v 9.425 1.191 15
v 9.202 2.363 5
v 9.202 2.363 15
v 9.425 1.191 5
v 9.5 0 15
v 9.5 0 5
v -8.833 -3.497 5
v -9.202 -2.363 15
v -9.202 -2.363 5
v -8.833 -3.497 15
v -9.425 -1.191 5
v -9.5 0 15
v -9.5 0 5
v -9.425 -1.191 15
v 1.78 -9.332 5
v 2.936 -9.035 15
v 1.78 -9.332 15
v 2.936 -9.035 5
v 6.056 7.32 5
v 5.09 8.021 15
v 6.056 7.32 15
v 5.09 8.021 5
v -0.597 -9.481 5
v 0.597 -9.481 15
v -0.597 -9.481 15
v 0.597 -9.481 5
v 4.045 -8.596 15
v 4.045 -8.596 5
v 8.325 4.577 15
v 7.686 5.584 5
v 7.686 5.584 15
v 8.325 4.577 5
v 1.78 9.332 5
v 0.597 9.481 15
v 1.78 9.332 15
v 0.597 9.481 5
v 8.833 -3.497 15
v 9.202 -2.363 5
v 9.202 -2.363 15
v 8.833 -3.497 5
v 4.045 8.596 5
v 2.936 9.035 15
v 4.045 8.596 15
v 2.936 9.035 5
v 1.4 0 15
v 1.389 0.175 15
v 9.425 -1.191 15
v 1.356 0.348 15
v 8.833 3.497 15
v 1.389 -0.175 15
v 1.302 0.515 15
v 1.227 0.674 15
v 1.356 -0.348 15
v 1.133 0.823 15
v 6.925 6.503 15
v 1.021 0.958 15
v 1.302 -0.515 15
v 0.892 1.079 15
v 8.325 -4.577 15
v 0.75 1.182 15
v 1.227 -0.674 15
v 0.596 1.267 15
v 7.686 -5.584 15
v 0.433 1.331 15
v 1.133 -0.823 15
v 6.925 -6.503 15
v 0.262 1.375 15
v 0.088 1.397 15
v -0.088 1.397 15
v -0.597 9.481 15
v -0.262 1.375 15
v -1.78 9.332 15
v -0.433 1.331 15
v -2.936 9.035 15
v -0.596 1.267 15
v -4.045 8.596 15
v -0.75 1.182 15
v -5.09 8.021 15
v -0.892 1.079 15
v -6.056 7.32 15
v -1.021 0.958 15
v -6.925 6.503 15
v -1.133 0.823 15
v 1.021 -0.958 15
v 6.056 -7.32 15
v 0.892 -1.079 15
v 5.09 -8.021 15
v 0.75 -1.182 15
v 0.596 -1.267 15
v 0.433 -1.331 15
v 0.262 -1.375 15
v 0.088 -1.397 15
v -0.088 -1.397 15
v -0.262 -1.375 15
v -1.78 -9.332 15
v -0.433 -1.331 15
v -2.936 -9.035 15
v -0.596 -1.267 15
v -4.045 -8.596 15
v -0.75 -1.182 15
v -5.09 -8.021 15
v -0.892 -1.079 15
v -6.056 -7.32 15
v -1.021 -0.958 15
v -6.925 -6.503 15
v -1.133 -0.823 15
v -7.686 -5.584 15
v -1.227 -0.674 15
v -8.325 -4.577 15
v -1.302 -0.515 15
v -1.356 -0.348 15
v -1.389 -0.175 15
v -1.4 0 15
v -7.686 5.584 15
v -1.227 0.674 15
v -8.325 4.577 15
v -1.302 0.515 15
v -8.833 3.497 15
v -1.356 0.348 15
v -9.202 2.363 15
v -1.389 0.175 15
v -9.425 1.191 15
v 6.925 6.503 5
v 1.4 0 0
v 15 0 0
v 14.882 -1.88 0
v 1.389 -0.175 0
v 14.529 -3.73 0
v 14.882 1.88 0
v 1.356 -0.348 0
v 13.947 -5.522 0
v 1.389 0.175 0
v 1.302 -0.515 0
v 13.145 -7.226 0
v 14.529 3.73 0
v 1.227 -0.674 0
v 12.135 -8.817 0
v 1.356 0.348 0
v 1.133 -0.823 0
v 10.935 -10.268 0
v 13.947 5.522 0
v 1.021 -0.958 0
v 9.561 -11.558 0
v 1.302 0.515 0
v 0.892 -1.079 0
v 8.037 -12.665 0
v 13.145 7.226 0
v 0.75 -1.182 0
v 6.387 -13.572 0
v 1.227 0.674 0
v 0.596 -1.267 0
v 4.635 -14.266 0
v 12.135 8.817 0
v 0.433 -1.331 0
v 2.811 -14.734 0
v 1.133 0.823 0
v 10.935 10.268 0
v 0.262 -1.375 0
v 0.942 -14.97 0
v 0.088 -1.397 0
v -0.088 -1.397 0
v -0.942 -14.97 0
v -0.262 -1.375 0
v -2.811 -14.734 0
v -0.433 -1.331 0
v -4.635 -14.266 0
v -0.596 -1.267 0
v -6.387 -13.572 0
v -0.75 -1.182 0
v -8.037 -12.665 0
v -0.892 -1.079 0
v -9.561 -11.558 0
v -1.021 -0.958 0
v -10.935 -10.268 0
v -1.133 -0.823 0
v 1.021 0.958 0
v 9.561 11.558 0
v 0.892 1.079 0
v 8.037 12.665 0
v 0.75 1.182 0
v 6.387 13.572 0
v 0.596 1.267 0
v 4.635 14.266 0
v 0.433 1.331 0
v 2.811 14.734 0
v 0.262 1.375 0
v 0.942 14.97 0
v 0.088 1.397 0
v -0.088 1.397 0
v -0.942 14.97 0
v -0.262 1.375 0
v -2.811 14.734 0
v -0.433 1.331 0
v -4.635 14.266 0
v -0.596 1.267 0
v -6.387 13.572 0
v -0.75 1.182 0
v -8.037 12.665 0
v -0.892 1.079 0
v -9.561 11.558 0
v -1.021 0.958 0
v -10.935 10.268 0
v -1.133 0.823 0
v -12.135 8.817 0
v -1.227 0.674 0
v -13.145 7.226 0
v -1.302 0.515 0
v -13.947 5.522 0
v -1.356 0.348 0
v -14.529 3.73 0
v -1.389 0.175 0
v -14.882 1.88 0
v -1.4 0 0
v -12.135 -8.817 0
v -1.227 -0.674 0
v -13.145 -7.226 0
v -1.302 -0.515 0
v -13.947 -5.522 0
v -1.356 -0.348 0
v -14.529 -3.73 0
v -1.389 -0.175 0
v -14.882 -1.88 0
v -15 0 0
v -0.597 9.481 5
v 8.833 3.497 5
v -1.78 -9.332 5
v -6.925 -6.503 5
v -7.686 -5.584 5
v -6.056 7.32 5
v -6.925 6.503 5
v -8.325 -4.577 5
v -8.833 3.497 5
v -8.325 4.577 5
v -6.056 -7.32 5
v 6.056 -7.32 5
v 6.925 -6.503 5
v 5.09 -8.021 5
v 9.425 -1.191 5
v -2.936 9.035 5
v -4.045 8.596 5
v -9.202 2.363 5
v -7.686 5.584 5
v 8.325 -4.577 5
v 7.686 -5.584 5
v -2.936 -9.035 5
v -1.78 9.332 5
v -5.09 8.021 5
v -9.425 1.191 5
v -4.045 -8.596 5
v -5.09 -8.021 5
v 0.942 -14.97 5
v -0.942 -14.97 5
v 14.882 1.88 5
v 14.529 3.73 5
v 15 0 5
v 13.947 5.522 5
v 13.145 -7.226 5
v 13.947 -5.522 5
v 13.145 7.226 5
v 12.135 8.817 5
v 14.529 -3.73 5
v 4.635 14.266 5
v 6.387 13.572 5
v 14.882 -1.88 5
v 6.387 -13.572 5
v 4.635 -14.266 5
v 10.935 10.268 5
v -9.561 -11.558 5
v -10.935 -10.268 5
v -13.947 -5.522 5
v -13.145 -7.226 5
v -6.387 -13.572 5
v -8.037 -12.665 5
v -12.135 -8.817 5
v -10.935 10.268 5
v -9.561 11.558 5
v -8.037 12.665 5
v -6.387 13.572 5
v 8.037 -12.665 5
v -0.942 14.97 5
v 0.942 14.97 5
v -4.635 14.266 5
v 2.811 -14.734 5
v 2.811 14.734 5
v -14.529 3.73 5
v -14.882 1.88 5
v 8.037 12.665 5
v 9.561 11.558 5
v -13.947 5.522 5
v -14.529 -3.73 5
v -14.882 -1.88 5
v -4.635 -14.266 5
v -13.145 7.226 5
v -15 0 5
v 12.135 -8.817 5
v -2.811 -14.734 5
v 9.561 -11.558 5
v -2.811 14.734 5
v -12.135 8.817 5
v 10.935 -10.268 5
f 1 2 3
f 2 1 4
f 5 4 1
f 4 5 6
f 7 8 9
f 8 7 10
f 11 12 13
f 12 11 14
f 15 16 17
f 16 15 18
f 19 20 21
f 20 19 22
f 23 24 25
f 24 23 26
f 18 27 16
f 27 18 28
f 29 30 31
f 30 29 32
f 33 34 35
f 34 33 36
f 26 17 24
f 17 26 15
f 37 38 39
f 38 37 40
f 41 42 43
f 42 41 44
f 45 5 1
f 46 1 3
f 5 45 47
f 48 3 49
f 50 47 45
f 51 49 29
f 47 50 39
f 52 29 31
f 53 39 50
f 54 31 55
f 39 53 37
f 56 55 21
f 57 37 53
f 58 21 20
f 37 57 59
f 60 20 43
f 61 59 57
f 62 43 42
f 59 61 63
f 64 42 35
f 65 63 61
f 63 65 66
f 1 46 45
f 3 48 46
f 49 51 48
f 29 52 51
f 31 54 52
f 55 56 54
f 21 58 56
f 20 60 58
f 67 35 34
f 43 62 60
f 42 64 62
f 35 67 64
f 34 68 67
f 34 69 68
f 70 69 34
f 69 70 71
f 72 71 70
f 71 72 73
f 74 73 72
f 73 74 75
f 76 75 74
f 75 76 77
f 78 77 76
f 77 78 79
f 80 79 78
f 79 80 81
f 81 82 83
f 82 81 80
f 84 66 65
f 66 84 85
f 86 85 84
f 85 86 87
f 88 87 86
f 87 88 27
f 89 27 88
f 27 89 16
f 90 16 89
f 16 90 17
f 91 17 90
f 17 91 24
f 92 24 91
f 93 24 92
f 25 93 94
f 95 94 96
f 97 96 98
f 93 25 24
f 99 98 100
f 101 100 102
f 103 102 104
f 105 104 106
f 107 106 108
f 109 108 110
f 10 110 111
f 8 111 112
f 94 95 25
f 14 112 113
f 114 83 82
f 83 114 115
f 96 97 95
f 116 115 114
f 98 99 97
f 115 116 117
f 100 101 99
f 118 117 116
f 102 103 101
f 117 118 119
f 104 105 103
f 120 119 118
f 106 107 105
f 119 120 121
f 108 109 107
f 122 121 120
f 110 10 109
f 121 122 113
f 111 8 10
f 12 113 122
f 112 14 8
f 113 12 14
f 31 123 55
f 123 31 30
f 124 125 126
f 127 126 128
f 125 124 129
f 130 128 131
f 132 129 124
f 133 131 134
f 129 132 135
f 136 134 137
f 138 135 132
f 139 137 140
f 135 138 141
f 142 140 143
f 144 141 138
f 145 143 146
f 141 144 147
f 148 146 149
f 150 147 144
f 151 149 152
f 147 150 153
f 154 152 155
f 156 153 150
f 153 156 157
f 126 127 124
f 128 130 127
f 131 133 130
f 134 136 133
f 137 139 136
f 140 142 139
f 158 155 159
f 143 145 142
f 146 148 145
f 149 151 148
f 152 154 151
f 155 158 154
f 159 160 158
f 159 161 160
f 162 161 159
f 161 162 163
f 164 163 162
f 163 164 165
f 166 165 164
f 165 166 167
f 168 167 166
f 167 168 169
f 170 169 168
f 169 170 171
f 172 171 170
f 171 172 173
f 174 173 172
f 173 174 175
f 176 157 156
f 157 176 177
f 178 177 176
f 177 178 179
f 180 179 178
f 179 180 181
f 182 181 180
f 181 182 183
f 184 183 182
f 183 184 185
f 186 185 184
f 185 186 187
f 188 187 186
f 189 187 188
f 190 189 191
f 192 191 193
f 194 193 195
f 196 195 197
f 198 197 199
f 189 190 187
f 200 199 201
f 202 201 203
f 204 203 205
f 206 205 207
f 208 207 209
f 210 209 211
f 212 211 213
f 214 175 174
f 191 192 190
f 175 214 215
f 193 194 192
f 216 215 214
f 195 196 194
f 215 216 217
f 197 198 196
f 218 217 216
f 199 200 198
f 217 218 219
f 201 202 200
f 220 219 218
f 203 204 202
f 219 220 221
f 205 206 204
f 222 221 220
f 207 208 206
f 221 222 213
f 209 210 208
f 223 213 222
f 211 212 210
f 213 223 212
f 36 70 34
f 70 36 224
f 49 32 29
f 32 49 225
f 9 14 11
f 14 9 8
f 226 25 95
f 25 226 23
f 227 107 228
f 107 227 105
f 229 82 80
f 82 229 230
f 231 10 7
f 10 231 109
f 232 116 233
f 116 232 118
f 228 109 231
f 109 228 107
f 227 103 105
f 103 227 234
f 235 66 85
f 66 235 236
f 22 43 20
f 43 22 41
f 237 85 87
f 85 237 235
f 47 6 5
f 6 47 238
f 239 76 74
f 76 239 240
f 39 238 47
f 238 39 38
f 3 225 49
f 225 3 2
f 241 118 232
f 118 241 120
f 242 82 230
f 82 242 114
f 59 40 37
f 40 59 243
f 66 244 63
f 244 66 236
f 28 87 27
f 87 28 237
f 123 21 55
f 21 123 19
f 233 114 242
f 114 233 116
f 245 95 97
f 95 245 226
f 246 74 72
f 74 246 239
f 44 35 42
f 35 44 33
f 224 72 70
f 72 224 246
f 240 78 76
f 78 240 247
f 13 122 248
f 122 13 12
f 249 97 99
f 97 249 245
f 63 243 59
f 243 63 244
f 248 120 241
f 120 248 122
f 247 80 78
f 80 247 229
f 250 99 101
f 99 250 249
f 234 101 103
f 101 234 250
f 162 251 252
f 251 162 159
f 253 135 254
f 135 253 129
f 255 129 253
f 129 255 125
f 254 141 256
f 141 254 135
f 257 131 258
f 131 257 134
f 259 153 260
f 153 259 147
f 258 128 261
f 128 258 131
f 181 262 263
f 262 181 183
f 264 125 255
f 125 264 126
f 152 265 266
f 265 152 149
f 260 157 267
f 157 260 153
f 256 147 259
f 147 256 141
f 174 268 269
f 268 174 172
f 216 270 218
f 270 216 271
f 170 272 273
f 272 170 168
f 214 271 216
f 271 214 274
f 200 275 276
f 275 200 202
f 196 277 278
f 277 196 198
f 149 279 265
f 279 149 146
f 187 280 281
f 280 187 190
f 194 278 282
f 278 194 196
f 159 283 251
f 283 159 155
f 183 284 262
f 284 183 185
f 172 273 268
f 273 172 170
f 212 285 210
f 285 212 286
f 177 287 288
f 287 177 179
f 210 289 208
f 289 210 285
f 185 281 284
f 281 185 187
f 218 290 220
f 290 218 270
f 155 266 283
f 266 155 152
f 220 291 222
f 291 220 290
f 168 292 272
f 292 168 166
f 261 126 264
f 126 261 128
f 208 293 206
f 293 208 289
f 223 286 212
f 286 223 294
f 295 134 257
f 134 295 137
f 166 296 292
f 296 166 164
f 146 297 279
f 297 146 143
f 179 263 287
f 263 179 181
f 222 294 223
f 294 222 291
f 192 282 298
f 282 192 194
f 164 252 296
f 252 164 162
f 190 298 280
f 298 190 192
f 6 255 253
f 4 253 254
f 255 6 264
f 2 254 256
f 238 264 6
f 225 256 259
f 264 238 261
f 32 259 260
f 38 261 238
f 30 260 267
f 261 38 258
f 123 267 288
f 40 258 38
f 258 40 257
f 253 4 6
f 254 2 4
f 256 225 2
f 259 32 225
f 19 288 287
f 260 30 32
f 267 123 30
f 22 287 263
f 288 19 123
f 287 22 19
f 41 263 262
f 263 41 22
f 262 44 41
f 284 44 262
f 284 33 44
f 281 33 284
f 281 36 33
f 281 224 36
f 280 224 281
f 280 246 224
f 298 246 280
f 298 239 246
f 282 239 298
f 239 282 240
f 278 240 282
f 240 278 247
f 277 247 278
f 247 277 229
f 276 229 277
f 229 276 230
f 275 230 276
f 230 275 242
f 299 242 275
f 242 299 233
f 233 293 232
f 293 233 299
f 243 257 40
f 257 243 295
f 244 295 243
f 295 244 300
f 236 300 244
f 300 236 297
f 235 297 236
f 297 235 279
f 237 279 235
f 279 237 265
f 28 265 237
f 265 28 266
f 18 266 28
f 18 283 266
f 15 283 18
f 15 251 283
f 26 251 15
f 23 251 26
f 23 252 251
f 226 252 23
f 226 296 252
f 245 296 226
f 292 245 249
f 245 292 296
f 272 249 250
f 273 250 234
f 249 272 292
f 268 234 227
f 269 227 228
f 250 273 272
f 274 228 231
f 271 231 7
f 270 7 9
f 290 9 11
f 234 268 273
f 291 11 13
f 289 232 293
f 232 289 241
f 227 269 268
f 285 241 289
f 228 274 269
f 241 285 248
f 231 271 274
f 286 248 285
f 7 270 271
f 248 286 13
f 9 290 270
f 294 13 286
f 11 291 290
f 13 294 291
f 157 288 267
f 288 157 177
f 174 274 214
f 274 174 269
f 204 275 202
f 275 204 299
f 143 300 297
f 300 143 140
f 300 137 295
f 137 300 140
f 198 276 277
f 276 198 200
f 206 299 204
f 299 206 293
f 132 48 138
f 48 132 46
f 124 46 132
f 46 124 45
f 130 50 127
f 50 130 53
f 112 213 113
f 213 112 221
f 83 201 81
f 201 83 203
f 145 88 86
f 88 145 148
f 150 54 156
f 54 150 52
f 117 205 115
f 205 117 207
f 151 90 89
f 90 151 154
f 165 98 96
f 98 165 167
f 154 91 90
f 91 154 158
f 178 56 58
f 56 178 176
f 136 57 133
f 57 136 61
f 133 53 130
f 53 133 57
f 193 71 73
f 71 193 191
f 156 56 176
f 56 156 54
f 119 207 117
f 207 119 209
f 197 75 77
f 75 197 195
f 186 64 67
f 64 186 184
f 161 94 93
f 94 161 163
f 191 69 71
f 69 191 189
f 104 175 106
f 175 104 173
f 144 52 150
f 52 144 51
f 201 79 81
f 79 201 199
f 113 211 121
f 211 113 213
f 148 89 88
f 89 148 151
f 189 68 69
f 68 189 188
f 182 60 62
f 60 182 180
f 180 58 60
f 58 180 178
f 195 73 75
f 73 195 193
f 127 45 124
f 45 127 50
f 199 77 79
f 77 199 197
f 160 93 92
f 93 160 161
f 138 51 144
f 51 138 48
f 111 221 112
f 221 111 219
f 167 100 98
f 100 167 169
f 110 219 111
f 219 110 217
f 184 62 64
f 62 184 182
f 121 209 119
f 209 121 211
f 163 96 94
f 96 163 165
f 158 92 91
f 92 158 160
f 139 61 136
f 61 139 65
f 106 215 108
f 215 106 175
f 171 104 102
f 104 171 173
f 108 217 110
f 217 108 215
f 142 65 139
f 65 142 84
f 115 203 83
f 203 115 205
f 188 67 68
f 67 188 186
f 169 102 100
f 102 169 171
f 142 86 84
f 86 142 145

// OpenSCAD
// Diameter of the hole the plug is plugged into
bottomDiameter = 19;
// Diameter of the top support, make this slightly smaller then the diameter of the circle you are trying to make
topDiameter = 30;
// Inner hole Diameter, adjust this to the dowel you will use for centering your material
holeDiameter = 2.8;
// Height of the top support, increase this if your tool needs more space on the bottom
topHeight = 5;
// Height of the bottom piece of the plug
bottomHeight = 10;

/* [Hidden] */
$fn = 50;
bottomRadius = bottomDiameter / 2;
topRadius = topDiameter / 2;
holeRadius = holeDiameter / 2;

totalHeight = topHeight + bottomHeight;

difference() {
  group() {
    cylinder(h = totalHeight, r = bottomRadius);
    cylinder(h = topHeight, r = topRadius);
  }
  
  cylinder(h = totalHeight + 2, r = holeRadius);
}
